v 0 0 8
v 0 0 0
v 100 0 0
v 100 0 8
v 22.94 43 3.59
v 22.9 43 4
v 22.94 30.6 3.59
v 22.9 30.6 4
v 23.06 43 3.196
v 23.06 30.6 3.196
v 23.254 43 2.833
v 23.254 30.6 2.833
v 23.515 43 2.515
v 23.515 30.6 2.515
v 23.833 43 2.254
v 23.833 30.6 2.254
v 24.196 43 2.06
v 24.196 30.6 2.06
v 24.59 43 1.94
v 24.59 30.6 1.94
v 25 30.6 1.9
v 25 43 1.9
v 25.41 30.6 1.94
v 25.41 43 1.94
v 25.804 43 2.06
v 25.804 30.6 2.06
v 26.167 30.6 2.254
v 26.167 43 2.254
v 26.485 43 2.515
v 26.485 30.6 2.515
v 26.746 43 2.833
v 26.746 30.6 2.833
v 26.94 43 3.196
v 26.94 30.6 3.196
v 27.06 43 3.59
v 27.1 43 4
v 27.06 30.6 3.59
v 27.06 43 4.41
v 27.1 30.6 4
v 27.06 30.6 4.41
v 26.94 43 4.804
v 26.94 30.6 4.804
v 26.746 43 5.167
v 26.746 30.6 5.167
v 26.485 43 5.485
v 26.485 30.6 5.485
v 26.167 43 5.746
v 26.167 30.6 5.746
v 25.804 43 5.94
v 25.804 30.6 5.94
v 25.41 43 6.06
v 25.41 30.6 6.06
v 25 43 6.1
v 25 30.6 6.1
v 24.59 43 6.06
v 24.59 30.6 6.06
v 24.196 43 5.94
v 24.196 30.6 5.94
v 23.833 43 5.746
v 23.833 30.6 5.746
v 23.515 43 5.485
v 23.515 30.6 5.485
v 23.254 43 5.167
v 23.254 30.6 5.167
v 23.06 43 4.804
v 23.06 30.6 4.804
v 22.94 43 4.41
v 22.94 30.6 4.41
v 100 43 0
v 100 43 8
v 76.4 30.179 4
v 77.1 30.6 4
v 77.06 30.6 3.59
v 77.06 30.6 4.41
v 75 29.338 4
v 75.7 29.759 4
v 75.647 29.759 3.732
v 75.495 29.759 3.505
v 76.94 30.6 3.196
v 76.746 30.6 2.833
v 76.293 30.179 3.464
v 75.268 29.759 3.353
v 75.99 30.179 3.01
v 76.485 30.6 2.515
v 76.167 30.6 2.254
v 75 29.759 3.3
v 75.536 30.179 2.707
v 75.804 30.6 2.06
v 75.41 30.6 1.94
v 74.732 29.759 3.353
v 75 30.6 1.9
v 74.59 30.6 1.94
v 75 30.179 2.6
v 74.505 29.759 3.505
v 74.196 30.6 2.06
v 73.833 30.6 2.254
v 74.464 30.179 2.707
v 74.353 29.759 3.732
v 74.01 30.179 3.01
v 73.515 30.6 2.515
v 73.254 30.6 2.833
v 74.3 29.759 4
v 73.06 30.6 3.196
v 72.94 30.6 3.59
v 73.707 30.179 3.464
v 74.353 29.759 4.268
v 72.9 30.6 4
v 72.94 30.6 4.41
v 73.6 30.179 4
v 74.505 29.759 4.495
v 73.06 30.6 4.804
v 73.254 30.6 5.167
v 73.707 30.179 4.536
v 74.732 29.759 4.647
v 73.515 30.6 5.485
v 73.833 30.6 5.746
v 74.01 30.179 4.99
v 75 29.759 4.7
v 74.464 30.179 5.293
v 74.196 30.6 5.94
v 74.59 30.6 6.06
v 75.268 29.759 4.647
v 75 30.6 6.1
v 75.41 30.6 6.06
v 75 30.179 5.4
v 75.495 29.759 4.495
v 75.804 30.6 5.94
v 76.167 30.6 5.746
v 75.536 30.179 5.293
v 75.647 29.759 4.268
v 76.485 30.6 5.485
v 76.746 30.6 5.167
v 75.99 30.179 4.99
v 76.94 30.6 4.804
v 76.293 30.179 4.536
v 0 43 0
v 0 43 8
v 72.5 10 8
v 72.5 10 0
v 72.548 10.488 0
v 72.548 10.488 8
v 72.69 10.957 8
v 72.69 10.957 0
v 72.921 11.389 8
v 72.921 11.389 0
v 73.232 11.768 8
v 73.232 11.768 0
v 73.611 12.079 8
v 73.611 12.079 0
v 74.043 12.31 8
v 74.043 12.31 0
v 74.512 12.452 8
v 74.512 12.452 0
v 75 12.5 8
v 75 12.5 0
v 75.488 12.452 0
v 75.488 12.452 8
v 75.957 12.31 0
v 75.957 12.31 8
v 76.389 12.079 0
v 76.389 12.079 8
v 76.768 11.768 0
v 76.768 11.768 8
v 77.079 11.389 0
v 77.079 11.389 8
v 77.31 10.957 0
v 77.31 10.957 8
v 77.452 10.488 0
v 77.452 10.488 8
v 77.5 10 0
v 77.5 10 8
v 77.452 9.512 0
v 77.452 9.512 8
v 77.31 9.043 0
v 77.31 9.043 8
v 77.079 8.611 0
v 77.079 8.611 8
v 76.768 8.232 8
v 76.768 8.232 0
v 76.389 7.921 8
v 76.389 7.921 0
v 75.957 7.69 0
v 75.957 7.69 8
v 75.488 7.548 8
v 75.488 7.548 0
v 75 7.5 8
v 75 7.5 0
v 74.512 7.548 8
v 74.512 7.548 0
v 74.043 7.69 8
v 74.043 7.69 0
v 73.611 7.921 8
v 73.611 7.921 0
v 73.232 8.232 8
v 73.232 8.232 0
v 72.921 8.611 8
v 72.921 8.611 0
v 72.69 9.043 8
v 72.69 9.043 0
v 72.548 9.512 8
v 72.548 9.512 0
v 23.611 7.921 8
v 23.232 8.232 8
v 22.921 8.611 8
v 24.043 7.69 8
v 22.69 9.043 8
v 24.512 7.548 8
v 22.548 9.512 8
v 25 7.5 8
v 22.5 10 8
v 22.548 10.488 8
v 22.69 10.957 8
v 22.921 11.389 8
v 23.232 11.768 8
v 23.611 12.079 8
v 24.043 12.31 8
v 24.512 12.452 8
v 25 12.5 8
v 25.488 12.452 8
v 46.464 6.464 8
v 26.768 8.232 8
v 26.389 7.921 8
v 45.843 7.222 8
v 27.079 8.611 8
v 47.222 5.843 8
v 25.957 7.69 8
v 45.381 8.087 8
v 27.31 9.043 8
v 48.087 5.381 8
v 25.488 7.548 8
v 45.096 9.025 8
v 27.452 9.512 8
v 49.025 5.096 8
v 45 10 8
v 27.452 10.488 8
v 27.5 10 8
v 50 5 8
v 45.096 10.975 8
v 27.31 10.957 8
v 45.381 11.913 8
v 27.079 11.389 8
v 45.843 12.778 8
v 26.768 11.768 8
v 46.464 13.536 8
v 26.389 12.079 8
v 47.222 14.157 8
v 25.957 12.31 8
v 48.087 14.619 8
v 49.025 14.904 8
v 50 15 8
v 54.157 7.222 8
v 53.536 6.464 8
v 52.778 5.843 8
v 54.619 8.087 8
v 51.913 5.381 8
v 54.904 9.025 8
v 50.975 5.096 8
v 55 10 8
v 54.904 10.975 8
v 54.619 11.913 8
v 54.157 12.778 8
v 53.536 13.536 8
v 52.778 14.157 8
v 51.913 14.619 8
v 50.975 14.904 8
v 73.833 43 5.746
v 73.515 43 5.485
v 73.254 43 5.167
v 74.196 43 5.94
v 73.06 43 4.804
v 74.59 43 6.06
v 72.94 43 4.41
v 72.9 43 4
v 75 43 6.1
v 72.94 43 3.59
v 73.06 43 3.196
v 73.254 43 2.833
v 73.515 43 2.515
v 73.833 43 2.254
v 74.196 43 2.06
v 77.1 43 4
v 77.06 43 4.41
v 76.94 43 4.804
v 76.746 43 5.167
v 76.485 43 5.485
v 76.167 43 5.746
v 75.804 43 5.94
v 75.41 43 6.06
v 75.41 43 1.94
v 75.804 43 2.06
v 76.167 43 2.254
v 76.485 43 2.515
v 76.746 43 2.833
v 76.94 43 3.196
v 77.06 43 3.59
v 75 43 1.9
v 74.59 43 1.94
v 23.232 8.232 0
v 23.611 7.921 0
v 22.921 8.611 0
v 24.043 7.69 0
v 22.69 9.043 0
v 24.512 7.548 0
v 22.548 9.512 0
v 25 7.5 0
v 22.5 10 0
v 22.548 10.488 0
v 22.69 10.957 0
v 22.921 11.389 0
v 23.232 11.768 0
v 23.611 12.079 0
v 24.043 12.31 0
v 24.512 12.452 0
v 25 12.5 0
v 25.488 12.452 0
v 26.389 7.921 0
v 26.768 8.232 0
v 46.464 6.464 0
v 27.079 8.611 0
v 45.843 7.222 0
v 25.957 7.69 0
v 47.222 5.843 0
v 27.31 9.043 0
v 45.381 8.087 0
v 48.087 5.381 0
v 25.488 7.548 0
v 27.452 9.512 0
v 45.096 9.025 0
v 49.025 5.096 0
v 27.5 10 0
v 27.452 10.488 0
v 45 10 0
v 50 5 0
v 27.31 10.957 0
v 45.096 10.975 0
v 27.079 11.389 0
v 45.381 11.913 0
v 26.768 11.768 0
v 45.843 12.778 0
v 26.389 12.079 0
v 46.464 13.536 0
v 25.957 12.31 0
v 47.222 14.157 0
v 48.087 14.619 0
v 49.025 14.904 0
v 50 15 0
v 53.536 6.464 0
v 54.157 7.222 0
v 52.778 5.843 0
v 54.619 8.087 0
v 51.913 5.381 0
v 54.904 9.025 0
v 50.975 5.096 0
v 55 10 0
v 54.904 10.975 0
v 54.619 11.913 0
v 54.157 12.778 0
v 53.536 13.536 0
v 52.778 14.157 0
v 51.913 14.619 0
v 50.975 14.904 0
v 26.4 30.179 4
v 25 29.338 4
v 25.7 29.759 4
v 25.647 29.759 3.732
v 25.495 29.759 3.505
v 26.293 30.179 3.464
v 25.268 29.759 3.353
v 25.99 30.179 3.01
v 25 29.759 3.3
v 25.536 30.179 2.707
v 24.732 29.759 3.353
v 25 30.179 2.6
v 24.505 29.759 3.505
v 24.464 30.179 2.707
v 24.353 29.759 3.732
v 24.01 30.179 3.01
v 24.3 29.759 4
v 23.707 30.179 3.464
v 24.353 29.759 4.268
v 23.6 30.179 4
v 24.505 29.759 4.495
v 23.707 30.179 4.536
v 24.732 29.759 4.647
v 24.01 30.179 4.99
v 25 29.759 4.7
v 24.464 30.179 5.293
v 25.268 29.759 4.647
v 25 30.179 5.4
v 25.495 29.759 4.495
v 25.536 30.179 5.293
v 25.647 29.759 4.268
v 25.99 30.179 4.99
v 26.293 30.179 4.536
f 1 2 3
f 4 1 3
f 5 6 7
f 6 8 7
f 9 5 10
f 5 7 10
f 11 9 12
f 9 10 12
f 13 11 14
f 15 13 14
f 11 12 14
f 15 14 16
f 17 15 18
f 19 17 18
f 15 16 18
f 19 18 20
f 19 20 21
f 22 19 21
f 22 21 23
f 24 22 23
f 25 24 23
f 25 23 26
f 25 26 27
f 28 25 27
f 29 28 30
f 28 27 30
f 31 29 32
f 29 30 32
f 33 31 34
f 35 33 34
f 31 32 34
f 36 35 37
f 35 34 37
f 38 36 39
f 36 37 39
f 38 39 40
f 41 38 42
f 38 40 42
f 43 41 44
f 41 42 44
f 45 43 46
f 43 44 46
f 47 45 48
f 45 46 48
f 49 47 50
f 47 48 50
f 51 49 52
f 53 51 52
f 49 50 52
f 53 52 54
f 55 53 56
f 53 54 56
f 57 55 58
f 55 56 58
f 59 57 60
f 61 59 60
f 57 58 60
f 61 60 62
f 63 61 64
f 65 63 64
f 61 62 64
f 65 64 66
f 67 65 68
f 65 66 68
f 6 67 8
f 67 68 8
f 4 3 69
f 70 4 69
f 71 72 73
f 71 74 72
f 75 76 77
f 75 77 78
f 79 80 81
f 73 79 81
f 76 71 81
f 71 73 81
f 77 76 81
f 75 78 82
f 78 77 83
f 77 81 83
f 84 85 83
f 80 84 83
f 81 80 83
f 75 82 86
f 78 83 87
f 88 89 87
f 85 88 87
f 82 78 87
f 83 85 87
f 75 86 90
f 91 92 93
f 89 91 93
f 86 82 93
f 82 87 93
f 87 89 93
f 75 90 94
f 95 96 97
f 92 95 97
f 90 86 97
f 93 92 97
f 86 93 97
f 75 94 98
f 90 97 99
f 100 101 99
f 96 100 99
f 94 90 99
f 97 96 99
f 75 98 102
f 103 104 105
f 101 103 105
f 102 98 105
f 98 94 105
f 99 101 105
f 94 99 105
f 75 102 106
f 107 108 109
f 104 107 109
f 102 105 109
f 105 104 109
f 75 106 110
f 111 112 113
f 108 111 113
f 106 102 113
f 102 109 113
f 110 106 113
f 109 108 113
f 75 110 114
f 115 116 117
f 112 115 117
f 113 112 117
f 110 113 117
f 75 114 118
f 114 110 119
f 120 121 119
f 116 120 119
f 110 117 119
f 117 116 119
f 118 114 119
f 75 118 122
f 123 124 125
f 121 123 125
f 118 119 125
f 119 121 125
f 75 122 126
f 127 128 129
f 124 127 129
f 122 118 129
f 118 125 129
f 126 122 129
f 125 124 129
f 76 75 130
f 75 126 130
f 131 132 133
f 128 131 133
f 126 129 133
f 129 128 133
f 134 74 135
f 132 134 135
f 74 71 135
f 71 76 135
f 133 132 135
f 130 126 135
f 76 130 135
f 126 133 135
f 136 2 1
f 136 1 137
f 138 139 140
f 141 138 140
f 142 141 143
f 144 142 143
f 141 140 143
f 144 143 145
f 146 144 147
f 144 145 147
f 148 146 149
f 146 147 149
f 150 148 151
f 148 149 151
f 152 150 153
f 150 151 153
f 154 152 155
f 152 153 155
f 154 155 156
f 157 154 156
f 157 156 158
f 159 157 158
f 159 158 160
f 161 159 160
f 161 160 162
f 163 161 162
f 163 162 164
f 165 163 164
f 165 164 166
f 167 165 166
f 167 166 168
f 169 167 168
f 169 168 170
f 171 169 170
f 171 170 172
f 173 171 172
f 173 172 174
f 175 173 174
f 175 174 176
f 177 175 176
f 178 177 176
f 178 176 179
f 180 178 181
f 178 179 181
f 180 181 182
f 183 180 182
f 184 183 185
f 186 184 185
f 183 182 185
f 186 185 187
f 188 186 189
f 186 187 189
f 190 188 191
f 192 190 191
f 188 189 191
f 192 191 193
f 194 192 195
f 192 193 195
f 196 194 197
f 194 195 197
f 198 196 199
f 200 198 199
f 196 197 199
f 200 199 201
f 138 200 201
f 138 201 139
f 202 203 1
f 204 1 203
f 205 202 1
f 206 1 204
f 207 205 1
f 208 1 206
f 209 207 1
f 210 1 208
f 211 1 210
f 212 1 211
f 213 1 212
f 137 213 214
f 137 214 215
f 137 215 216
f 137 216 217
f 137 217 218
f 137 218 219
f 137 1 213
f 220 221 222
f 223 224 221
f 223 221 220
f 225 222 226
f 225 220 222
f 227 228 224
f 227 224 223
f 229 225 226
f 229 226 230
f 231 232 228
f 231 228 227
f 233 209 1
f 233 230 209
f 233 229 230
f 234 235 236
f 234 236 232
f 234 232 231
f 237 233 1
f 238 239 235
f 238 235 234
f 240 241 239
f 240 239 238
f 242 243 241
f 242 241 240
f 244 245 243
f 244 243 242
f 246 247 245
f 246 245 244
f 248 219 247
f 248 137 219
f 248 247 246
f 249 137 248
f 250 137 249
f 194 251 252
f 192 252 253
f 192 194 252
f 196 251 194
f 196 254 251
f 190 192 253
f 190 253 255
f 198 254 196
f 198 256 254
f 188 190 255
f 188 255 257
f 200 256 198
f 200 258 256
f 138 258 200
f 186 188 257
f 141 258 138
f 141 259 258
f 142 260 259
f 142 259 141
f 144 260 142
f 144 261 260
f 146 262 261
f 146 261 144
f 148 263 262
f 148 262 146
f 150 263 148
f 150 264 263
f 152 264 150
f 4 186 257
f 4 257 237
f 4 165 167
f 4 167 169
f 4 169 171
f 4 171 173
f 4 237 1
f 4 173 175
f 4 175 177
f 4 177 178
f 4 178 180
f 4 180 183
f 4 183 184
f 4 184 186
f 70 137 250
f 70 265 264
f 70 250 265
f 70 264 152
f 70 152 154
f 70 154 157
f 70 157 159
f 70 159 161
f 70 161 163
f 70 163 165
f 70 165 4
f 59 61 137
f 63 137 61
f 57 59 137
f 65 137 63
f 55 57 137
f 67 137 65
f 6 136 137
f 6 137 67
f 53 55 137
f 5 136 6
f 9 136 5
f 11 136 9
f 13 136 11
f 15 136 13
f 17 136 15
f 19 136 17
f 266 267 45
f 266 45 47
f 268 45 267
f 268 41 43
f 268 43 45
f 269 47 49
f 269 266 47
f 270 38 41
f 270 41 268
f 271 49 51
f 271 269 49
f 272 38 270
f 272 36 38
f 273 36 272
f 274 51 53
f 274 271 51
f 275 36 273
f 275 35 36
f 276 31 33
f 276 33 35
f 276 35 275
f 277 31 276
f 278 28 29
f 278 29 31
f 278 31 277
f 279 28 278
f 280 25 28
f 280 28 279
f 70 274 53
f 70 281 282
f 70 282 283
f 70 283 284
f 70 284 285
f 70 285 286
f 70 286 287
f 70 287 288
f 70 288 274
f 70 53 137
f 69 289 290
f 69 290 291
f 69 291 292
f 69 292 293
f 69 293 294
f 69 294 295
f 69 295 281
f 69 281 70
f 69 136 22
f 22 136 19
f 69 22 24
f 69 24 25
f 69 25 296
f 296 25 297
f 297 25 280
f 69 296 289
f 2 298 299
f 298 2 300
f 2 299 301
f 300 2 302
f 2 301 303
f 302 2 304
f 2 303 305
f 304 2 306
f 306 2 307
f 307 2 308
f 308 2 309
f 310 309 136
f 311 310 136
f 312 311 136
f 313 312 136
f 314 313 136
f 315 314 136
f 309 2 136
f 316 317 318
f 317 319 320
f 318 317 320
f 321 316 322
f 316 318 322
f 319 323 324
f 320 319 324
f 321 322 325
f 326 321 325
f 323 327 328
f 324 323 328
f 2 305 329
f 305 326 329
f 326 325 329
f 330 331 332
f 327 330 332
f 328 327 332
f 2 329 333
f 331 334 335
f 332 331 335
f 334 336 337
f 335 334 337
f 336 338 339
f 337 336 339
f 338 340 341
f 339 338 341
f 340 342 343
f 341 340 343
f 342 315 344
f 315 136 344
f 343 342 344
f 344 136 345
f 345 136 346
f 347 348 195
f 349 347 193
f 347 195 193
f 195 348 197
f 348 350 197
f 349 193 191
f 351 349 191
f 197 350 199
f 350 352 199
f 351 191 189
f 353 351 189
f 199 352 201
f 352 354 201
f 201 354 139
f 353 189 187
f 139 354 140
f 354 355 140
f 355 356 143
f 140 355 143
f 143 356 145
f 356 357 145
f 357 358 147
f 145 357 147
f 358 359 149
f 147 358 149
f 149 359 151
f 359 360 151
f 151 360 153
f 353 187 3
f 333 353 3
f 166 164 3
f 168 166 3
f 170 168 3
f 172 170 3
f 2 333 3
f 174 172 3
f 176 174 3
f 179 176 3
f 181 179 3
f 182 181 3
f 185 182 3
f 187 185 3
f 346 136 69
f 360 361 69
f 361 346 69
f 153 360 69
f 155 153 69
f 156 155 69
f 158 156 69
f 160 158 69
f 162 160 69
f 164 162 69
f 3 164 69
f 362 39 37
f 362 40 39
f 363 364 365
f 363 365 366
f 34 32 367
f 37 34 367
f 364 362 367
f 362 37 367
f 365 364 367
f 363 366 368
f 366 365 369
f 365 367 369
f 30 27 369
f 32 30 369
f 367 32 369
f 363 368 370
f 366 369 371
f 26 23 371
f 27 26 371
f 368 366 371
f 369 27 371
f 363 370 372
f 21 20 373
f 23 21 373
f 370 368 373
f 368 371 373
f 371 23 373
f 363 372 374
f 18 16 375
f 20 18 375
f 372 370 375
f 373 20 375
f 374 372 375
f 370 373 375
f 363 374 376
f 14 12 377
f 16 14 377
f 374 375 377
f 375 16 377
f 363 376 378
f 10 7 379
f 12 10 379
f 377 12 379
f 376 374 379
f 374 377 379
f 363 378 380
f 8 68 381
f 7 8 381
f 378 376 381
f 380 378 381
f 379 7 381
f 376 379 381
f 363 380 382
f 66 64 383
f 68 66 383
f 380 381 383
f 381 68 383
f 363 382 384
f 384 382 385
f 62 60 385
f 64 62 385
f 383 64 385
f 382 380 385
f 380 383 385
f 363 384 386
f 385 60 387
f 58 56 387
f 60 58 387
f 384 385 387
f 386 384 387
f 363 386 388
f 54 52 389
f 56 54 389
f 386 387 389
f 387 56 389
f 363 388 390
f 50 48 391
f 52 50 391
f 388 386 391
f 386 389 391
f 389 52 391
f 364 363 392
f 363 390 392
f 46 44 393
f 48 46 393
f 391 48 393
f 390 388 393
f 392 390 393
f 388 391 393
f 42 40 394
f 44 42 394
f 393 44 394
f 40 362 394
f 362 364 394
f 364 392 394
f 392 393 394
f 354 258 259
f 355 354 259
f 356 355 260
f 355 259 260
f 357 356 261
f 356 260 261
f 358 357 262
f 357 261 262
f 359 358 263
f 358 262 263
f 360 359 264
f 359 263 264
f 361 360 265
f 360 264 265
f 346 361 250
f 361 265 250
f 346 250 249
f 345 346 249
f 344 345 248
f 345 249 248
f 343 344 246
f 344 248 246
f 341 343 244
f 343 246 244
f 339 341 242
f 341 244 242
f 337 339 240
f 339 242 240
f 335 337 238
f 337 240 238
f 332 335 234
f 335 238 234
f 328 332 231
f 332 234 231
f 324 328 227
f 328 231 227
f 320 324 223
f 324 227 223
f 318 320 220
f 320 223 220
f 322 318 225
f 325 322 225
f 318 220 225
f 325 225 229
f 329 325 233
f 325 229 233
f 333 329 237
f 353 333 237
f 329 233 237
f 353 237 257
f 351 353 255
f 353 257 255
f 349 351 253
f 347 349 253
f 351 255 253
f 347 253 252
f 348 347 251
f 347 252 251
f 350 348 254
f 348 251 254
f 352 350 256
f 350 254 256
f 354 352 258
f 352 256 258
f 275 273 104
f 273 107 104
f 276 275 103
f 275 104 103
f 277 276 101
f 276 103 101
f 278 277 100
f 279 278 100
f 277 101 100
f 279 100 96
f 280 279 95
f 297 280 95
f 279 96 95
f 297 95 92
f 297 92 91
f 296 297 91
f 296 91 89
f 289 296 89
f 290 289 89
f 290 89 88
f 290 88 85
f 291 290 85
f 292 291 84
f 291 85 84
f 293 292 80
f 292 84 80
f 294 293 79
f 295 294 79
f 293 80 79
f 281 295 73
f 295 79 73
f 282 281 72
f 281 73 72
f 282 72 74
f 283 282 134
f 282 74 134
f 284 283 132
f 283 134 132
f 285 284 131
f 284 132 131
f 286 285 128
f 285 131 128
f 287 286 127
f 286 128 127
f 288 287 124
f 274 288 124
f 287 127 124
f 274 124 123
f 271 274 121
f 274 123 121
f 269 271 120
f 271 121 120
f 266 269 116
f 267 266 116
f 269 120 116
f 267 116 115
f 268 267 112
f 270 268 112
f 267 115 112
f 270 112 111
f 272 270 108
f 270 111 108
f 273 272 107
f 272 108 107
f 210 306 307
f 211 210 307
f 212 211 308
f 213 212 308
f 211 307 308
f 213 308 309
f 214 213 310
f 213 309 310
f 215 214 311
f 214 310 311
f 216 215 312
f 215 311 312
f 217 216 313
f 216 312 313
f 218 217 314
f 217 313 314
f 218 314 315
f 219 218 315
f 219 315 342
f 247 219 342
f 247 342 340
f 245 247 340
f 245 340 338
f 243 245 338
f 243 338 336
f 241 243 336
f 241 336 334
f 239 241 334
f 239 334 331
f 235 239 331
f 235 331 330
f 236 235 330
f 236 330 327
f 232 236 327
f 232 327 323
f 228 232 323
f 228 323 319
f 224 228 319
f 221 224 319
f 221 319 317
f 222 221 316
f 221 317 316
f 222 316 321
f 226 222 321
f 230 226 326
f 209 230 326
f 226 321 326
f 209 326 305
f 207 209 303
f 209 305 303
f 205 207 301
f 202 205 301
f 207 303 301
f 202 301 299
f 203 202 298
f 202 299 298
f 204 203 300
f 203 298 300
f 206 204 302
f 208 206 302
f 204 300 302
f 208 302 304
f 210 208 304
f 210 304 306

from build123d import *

# Parameters (mm, degrees)
SKETCH_2_W             = 100
SKETCH_2_H             = 43
EXTRUDE_1_DEPTH        = 8
SKETCH_3_R             = 5
CUT_EXTRUDE_1_DEPTH    = 8
HOLE_WIZARD_M6_1_D     = 5
HOLE_WIZARD_M6_1_DEPTH = 15
HOLE_WIZARD_M6_1_TIP   = 1.502151548
HOLE_WIZARD_M5_1_D     = 4.2
HOLE_WIZARD_M5_1_DEPTH = 12.4
HOLE_WIZARD_M5_1_TIP   = 1.2618073


with BuildPart() as part:
    # 草图2 → 凸台-拉伸1 (new body)
    with BuildSketch(Plane.XY):
        with Locations((50, 21.5)):
            Rectangle(SKETCH_2_W, SKETCH_2_H)
    extrude(amount=EXTRUDE_1_DEPTH)

    # 草图3 → 切除-拉伸1 (cut)
    with BuildSketch(Plane.XY.offset(8)):
        with Locations((50, 10)):
            Circle(SKETCH_3_R)
    extrude(amount=-CUT_EXTRUDE_1_DEPTH, mode=Mode.SUBTRACT)

    # M6 螺纹孔1
    with Locations(Plane.XY.offset(8)):
        with Locations((25, 10), (75, 10)):
            Hole(HOLE_WIZARD_M6_1_D / 2, depth=HOLE_WIZARD_M6_1_DEPTH)
            with Locations((0, 0, -(HOLE_WIZARD_M6_1_DEPTH + HOLE_WIZARD_M6_1_TIP / 2))):  # 118° drill point
                Cone(0, HOLE_WIZARD_M6_1_D / 2, HOLE_WIZARD_M6_1_TIP, mode=Mode.SUBTRACT)

    # M5 螺纹孔1
    with Locations(Plane(origin=(0, 43, 0), x_dir=(1, 0, 0), z_dir=(0, 1, 0))):
        with Locations((25, -4), (75, -4)):
            Hole(HOLE_WIZARD_M5_1_D / 2, depth=HOLE_WIZARD_M5_1_DEPTH)
            with Locations((0, 0, -(HOLE_WIZARD_M5_1_DEPTH + HOLE_WIZARD_M5_1_TIP / 2))):  # 118° drill point
                Cone(0, HOLE_WIZARD_M5_1_D / 2, HOLE_WIZARD_M5_1_TIP, mode=Mode.SUBTRACT)


solid = part.part
